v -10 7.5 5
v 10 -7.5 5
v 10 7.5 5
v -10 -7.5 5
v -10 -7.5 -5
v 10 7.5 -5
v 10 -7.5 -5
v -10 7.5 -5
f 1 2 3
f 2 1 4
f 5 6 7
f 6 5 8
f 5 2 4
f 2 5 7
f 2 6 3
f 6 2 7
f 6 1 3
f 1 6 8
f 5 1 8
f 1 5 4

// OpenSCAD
// param: width=20, depth=15, height=10
module rectangular_box(width=20, depth=15, height=10) {
    cube([width, depth, height], center=true);
}
rectangular_box(width=20, depth=15, height=10);
